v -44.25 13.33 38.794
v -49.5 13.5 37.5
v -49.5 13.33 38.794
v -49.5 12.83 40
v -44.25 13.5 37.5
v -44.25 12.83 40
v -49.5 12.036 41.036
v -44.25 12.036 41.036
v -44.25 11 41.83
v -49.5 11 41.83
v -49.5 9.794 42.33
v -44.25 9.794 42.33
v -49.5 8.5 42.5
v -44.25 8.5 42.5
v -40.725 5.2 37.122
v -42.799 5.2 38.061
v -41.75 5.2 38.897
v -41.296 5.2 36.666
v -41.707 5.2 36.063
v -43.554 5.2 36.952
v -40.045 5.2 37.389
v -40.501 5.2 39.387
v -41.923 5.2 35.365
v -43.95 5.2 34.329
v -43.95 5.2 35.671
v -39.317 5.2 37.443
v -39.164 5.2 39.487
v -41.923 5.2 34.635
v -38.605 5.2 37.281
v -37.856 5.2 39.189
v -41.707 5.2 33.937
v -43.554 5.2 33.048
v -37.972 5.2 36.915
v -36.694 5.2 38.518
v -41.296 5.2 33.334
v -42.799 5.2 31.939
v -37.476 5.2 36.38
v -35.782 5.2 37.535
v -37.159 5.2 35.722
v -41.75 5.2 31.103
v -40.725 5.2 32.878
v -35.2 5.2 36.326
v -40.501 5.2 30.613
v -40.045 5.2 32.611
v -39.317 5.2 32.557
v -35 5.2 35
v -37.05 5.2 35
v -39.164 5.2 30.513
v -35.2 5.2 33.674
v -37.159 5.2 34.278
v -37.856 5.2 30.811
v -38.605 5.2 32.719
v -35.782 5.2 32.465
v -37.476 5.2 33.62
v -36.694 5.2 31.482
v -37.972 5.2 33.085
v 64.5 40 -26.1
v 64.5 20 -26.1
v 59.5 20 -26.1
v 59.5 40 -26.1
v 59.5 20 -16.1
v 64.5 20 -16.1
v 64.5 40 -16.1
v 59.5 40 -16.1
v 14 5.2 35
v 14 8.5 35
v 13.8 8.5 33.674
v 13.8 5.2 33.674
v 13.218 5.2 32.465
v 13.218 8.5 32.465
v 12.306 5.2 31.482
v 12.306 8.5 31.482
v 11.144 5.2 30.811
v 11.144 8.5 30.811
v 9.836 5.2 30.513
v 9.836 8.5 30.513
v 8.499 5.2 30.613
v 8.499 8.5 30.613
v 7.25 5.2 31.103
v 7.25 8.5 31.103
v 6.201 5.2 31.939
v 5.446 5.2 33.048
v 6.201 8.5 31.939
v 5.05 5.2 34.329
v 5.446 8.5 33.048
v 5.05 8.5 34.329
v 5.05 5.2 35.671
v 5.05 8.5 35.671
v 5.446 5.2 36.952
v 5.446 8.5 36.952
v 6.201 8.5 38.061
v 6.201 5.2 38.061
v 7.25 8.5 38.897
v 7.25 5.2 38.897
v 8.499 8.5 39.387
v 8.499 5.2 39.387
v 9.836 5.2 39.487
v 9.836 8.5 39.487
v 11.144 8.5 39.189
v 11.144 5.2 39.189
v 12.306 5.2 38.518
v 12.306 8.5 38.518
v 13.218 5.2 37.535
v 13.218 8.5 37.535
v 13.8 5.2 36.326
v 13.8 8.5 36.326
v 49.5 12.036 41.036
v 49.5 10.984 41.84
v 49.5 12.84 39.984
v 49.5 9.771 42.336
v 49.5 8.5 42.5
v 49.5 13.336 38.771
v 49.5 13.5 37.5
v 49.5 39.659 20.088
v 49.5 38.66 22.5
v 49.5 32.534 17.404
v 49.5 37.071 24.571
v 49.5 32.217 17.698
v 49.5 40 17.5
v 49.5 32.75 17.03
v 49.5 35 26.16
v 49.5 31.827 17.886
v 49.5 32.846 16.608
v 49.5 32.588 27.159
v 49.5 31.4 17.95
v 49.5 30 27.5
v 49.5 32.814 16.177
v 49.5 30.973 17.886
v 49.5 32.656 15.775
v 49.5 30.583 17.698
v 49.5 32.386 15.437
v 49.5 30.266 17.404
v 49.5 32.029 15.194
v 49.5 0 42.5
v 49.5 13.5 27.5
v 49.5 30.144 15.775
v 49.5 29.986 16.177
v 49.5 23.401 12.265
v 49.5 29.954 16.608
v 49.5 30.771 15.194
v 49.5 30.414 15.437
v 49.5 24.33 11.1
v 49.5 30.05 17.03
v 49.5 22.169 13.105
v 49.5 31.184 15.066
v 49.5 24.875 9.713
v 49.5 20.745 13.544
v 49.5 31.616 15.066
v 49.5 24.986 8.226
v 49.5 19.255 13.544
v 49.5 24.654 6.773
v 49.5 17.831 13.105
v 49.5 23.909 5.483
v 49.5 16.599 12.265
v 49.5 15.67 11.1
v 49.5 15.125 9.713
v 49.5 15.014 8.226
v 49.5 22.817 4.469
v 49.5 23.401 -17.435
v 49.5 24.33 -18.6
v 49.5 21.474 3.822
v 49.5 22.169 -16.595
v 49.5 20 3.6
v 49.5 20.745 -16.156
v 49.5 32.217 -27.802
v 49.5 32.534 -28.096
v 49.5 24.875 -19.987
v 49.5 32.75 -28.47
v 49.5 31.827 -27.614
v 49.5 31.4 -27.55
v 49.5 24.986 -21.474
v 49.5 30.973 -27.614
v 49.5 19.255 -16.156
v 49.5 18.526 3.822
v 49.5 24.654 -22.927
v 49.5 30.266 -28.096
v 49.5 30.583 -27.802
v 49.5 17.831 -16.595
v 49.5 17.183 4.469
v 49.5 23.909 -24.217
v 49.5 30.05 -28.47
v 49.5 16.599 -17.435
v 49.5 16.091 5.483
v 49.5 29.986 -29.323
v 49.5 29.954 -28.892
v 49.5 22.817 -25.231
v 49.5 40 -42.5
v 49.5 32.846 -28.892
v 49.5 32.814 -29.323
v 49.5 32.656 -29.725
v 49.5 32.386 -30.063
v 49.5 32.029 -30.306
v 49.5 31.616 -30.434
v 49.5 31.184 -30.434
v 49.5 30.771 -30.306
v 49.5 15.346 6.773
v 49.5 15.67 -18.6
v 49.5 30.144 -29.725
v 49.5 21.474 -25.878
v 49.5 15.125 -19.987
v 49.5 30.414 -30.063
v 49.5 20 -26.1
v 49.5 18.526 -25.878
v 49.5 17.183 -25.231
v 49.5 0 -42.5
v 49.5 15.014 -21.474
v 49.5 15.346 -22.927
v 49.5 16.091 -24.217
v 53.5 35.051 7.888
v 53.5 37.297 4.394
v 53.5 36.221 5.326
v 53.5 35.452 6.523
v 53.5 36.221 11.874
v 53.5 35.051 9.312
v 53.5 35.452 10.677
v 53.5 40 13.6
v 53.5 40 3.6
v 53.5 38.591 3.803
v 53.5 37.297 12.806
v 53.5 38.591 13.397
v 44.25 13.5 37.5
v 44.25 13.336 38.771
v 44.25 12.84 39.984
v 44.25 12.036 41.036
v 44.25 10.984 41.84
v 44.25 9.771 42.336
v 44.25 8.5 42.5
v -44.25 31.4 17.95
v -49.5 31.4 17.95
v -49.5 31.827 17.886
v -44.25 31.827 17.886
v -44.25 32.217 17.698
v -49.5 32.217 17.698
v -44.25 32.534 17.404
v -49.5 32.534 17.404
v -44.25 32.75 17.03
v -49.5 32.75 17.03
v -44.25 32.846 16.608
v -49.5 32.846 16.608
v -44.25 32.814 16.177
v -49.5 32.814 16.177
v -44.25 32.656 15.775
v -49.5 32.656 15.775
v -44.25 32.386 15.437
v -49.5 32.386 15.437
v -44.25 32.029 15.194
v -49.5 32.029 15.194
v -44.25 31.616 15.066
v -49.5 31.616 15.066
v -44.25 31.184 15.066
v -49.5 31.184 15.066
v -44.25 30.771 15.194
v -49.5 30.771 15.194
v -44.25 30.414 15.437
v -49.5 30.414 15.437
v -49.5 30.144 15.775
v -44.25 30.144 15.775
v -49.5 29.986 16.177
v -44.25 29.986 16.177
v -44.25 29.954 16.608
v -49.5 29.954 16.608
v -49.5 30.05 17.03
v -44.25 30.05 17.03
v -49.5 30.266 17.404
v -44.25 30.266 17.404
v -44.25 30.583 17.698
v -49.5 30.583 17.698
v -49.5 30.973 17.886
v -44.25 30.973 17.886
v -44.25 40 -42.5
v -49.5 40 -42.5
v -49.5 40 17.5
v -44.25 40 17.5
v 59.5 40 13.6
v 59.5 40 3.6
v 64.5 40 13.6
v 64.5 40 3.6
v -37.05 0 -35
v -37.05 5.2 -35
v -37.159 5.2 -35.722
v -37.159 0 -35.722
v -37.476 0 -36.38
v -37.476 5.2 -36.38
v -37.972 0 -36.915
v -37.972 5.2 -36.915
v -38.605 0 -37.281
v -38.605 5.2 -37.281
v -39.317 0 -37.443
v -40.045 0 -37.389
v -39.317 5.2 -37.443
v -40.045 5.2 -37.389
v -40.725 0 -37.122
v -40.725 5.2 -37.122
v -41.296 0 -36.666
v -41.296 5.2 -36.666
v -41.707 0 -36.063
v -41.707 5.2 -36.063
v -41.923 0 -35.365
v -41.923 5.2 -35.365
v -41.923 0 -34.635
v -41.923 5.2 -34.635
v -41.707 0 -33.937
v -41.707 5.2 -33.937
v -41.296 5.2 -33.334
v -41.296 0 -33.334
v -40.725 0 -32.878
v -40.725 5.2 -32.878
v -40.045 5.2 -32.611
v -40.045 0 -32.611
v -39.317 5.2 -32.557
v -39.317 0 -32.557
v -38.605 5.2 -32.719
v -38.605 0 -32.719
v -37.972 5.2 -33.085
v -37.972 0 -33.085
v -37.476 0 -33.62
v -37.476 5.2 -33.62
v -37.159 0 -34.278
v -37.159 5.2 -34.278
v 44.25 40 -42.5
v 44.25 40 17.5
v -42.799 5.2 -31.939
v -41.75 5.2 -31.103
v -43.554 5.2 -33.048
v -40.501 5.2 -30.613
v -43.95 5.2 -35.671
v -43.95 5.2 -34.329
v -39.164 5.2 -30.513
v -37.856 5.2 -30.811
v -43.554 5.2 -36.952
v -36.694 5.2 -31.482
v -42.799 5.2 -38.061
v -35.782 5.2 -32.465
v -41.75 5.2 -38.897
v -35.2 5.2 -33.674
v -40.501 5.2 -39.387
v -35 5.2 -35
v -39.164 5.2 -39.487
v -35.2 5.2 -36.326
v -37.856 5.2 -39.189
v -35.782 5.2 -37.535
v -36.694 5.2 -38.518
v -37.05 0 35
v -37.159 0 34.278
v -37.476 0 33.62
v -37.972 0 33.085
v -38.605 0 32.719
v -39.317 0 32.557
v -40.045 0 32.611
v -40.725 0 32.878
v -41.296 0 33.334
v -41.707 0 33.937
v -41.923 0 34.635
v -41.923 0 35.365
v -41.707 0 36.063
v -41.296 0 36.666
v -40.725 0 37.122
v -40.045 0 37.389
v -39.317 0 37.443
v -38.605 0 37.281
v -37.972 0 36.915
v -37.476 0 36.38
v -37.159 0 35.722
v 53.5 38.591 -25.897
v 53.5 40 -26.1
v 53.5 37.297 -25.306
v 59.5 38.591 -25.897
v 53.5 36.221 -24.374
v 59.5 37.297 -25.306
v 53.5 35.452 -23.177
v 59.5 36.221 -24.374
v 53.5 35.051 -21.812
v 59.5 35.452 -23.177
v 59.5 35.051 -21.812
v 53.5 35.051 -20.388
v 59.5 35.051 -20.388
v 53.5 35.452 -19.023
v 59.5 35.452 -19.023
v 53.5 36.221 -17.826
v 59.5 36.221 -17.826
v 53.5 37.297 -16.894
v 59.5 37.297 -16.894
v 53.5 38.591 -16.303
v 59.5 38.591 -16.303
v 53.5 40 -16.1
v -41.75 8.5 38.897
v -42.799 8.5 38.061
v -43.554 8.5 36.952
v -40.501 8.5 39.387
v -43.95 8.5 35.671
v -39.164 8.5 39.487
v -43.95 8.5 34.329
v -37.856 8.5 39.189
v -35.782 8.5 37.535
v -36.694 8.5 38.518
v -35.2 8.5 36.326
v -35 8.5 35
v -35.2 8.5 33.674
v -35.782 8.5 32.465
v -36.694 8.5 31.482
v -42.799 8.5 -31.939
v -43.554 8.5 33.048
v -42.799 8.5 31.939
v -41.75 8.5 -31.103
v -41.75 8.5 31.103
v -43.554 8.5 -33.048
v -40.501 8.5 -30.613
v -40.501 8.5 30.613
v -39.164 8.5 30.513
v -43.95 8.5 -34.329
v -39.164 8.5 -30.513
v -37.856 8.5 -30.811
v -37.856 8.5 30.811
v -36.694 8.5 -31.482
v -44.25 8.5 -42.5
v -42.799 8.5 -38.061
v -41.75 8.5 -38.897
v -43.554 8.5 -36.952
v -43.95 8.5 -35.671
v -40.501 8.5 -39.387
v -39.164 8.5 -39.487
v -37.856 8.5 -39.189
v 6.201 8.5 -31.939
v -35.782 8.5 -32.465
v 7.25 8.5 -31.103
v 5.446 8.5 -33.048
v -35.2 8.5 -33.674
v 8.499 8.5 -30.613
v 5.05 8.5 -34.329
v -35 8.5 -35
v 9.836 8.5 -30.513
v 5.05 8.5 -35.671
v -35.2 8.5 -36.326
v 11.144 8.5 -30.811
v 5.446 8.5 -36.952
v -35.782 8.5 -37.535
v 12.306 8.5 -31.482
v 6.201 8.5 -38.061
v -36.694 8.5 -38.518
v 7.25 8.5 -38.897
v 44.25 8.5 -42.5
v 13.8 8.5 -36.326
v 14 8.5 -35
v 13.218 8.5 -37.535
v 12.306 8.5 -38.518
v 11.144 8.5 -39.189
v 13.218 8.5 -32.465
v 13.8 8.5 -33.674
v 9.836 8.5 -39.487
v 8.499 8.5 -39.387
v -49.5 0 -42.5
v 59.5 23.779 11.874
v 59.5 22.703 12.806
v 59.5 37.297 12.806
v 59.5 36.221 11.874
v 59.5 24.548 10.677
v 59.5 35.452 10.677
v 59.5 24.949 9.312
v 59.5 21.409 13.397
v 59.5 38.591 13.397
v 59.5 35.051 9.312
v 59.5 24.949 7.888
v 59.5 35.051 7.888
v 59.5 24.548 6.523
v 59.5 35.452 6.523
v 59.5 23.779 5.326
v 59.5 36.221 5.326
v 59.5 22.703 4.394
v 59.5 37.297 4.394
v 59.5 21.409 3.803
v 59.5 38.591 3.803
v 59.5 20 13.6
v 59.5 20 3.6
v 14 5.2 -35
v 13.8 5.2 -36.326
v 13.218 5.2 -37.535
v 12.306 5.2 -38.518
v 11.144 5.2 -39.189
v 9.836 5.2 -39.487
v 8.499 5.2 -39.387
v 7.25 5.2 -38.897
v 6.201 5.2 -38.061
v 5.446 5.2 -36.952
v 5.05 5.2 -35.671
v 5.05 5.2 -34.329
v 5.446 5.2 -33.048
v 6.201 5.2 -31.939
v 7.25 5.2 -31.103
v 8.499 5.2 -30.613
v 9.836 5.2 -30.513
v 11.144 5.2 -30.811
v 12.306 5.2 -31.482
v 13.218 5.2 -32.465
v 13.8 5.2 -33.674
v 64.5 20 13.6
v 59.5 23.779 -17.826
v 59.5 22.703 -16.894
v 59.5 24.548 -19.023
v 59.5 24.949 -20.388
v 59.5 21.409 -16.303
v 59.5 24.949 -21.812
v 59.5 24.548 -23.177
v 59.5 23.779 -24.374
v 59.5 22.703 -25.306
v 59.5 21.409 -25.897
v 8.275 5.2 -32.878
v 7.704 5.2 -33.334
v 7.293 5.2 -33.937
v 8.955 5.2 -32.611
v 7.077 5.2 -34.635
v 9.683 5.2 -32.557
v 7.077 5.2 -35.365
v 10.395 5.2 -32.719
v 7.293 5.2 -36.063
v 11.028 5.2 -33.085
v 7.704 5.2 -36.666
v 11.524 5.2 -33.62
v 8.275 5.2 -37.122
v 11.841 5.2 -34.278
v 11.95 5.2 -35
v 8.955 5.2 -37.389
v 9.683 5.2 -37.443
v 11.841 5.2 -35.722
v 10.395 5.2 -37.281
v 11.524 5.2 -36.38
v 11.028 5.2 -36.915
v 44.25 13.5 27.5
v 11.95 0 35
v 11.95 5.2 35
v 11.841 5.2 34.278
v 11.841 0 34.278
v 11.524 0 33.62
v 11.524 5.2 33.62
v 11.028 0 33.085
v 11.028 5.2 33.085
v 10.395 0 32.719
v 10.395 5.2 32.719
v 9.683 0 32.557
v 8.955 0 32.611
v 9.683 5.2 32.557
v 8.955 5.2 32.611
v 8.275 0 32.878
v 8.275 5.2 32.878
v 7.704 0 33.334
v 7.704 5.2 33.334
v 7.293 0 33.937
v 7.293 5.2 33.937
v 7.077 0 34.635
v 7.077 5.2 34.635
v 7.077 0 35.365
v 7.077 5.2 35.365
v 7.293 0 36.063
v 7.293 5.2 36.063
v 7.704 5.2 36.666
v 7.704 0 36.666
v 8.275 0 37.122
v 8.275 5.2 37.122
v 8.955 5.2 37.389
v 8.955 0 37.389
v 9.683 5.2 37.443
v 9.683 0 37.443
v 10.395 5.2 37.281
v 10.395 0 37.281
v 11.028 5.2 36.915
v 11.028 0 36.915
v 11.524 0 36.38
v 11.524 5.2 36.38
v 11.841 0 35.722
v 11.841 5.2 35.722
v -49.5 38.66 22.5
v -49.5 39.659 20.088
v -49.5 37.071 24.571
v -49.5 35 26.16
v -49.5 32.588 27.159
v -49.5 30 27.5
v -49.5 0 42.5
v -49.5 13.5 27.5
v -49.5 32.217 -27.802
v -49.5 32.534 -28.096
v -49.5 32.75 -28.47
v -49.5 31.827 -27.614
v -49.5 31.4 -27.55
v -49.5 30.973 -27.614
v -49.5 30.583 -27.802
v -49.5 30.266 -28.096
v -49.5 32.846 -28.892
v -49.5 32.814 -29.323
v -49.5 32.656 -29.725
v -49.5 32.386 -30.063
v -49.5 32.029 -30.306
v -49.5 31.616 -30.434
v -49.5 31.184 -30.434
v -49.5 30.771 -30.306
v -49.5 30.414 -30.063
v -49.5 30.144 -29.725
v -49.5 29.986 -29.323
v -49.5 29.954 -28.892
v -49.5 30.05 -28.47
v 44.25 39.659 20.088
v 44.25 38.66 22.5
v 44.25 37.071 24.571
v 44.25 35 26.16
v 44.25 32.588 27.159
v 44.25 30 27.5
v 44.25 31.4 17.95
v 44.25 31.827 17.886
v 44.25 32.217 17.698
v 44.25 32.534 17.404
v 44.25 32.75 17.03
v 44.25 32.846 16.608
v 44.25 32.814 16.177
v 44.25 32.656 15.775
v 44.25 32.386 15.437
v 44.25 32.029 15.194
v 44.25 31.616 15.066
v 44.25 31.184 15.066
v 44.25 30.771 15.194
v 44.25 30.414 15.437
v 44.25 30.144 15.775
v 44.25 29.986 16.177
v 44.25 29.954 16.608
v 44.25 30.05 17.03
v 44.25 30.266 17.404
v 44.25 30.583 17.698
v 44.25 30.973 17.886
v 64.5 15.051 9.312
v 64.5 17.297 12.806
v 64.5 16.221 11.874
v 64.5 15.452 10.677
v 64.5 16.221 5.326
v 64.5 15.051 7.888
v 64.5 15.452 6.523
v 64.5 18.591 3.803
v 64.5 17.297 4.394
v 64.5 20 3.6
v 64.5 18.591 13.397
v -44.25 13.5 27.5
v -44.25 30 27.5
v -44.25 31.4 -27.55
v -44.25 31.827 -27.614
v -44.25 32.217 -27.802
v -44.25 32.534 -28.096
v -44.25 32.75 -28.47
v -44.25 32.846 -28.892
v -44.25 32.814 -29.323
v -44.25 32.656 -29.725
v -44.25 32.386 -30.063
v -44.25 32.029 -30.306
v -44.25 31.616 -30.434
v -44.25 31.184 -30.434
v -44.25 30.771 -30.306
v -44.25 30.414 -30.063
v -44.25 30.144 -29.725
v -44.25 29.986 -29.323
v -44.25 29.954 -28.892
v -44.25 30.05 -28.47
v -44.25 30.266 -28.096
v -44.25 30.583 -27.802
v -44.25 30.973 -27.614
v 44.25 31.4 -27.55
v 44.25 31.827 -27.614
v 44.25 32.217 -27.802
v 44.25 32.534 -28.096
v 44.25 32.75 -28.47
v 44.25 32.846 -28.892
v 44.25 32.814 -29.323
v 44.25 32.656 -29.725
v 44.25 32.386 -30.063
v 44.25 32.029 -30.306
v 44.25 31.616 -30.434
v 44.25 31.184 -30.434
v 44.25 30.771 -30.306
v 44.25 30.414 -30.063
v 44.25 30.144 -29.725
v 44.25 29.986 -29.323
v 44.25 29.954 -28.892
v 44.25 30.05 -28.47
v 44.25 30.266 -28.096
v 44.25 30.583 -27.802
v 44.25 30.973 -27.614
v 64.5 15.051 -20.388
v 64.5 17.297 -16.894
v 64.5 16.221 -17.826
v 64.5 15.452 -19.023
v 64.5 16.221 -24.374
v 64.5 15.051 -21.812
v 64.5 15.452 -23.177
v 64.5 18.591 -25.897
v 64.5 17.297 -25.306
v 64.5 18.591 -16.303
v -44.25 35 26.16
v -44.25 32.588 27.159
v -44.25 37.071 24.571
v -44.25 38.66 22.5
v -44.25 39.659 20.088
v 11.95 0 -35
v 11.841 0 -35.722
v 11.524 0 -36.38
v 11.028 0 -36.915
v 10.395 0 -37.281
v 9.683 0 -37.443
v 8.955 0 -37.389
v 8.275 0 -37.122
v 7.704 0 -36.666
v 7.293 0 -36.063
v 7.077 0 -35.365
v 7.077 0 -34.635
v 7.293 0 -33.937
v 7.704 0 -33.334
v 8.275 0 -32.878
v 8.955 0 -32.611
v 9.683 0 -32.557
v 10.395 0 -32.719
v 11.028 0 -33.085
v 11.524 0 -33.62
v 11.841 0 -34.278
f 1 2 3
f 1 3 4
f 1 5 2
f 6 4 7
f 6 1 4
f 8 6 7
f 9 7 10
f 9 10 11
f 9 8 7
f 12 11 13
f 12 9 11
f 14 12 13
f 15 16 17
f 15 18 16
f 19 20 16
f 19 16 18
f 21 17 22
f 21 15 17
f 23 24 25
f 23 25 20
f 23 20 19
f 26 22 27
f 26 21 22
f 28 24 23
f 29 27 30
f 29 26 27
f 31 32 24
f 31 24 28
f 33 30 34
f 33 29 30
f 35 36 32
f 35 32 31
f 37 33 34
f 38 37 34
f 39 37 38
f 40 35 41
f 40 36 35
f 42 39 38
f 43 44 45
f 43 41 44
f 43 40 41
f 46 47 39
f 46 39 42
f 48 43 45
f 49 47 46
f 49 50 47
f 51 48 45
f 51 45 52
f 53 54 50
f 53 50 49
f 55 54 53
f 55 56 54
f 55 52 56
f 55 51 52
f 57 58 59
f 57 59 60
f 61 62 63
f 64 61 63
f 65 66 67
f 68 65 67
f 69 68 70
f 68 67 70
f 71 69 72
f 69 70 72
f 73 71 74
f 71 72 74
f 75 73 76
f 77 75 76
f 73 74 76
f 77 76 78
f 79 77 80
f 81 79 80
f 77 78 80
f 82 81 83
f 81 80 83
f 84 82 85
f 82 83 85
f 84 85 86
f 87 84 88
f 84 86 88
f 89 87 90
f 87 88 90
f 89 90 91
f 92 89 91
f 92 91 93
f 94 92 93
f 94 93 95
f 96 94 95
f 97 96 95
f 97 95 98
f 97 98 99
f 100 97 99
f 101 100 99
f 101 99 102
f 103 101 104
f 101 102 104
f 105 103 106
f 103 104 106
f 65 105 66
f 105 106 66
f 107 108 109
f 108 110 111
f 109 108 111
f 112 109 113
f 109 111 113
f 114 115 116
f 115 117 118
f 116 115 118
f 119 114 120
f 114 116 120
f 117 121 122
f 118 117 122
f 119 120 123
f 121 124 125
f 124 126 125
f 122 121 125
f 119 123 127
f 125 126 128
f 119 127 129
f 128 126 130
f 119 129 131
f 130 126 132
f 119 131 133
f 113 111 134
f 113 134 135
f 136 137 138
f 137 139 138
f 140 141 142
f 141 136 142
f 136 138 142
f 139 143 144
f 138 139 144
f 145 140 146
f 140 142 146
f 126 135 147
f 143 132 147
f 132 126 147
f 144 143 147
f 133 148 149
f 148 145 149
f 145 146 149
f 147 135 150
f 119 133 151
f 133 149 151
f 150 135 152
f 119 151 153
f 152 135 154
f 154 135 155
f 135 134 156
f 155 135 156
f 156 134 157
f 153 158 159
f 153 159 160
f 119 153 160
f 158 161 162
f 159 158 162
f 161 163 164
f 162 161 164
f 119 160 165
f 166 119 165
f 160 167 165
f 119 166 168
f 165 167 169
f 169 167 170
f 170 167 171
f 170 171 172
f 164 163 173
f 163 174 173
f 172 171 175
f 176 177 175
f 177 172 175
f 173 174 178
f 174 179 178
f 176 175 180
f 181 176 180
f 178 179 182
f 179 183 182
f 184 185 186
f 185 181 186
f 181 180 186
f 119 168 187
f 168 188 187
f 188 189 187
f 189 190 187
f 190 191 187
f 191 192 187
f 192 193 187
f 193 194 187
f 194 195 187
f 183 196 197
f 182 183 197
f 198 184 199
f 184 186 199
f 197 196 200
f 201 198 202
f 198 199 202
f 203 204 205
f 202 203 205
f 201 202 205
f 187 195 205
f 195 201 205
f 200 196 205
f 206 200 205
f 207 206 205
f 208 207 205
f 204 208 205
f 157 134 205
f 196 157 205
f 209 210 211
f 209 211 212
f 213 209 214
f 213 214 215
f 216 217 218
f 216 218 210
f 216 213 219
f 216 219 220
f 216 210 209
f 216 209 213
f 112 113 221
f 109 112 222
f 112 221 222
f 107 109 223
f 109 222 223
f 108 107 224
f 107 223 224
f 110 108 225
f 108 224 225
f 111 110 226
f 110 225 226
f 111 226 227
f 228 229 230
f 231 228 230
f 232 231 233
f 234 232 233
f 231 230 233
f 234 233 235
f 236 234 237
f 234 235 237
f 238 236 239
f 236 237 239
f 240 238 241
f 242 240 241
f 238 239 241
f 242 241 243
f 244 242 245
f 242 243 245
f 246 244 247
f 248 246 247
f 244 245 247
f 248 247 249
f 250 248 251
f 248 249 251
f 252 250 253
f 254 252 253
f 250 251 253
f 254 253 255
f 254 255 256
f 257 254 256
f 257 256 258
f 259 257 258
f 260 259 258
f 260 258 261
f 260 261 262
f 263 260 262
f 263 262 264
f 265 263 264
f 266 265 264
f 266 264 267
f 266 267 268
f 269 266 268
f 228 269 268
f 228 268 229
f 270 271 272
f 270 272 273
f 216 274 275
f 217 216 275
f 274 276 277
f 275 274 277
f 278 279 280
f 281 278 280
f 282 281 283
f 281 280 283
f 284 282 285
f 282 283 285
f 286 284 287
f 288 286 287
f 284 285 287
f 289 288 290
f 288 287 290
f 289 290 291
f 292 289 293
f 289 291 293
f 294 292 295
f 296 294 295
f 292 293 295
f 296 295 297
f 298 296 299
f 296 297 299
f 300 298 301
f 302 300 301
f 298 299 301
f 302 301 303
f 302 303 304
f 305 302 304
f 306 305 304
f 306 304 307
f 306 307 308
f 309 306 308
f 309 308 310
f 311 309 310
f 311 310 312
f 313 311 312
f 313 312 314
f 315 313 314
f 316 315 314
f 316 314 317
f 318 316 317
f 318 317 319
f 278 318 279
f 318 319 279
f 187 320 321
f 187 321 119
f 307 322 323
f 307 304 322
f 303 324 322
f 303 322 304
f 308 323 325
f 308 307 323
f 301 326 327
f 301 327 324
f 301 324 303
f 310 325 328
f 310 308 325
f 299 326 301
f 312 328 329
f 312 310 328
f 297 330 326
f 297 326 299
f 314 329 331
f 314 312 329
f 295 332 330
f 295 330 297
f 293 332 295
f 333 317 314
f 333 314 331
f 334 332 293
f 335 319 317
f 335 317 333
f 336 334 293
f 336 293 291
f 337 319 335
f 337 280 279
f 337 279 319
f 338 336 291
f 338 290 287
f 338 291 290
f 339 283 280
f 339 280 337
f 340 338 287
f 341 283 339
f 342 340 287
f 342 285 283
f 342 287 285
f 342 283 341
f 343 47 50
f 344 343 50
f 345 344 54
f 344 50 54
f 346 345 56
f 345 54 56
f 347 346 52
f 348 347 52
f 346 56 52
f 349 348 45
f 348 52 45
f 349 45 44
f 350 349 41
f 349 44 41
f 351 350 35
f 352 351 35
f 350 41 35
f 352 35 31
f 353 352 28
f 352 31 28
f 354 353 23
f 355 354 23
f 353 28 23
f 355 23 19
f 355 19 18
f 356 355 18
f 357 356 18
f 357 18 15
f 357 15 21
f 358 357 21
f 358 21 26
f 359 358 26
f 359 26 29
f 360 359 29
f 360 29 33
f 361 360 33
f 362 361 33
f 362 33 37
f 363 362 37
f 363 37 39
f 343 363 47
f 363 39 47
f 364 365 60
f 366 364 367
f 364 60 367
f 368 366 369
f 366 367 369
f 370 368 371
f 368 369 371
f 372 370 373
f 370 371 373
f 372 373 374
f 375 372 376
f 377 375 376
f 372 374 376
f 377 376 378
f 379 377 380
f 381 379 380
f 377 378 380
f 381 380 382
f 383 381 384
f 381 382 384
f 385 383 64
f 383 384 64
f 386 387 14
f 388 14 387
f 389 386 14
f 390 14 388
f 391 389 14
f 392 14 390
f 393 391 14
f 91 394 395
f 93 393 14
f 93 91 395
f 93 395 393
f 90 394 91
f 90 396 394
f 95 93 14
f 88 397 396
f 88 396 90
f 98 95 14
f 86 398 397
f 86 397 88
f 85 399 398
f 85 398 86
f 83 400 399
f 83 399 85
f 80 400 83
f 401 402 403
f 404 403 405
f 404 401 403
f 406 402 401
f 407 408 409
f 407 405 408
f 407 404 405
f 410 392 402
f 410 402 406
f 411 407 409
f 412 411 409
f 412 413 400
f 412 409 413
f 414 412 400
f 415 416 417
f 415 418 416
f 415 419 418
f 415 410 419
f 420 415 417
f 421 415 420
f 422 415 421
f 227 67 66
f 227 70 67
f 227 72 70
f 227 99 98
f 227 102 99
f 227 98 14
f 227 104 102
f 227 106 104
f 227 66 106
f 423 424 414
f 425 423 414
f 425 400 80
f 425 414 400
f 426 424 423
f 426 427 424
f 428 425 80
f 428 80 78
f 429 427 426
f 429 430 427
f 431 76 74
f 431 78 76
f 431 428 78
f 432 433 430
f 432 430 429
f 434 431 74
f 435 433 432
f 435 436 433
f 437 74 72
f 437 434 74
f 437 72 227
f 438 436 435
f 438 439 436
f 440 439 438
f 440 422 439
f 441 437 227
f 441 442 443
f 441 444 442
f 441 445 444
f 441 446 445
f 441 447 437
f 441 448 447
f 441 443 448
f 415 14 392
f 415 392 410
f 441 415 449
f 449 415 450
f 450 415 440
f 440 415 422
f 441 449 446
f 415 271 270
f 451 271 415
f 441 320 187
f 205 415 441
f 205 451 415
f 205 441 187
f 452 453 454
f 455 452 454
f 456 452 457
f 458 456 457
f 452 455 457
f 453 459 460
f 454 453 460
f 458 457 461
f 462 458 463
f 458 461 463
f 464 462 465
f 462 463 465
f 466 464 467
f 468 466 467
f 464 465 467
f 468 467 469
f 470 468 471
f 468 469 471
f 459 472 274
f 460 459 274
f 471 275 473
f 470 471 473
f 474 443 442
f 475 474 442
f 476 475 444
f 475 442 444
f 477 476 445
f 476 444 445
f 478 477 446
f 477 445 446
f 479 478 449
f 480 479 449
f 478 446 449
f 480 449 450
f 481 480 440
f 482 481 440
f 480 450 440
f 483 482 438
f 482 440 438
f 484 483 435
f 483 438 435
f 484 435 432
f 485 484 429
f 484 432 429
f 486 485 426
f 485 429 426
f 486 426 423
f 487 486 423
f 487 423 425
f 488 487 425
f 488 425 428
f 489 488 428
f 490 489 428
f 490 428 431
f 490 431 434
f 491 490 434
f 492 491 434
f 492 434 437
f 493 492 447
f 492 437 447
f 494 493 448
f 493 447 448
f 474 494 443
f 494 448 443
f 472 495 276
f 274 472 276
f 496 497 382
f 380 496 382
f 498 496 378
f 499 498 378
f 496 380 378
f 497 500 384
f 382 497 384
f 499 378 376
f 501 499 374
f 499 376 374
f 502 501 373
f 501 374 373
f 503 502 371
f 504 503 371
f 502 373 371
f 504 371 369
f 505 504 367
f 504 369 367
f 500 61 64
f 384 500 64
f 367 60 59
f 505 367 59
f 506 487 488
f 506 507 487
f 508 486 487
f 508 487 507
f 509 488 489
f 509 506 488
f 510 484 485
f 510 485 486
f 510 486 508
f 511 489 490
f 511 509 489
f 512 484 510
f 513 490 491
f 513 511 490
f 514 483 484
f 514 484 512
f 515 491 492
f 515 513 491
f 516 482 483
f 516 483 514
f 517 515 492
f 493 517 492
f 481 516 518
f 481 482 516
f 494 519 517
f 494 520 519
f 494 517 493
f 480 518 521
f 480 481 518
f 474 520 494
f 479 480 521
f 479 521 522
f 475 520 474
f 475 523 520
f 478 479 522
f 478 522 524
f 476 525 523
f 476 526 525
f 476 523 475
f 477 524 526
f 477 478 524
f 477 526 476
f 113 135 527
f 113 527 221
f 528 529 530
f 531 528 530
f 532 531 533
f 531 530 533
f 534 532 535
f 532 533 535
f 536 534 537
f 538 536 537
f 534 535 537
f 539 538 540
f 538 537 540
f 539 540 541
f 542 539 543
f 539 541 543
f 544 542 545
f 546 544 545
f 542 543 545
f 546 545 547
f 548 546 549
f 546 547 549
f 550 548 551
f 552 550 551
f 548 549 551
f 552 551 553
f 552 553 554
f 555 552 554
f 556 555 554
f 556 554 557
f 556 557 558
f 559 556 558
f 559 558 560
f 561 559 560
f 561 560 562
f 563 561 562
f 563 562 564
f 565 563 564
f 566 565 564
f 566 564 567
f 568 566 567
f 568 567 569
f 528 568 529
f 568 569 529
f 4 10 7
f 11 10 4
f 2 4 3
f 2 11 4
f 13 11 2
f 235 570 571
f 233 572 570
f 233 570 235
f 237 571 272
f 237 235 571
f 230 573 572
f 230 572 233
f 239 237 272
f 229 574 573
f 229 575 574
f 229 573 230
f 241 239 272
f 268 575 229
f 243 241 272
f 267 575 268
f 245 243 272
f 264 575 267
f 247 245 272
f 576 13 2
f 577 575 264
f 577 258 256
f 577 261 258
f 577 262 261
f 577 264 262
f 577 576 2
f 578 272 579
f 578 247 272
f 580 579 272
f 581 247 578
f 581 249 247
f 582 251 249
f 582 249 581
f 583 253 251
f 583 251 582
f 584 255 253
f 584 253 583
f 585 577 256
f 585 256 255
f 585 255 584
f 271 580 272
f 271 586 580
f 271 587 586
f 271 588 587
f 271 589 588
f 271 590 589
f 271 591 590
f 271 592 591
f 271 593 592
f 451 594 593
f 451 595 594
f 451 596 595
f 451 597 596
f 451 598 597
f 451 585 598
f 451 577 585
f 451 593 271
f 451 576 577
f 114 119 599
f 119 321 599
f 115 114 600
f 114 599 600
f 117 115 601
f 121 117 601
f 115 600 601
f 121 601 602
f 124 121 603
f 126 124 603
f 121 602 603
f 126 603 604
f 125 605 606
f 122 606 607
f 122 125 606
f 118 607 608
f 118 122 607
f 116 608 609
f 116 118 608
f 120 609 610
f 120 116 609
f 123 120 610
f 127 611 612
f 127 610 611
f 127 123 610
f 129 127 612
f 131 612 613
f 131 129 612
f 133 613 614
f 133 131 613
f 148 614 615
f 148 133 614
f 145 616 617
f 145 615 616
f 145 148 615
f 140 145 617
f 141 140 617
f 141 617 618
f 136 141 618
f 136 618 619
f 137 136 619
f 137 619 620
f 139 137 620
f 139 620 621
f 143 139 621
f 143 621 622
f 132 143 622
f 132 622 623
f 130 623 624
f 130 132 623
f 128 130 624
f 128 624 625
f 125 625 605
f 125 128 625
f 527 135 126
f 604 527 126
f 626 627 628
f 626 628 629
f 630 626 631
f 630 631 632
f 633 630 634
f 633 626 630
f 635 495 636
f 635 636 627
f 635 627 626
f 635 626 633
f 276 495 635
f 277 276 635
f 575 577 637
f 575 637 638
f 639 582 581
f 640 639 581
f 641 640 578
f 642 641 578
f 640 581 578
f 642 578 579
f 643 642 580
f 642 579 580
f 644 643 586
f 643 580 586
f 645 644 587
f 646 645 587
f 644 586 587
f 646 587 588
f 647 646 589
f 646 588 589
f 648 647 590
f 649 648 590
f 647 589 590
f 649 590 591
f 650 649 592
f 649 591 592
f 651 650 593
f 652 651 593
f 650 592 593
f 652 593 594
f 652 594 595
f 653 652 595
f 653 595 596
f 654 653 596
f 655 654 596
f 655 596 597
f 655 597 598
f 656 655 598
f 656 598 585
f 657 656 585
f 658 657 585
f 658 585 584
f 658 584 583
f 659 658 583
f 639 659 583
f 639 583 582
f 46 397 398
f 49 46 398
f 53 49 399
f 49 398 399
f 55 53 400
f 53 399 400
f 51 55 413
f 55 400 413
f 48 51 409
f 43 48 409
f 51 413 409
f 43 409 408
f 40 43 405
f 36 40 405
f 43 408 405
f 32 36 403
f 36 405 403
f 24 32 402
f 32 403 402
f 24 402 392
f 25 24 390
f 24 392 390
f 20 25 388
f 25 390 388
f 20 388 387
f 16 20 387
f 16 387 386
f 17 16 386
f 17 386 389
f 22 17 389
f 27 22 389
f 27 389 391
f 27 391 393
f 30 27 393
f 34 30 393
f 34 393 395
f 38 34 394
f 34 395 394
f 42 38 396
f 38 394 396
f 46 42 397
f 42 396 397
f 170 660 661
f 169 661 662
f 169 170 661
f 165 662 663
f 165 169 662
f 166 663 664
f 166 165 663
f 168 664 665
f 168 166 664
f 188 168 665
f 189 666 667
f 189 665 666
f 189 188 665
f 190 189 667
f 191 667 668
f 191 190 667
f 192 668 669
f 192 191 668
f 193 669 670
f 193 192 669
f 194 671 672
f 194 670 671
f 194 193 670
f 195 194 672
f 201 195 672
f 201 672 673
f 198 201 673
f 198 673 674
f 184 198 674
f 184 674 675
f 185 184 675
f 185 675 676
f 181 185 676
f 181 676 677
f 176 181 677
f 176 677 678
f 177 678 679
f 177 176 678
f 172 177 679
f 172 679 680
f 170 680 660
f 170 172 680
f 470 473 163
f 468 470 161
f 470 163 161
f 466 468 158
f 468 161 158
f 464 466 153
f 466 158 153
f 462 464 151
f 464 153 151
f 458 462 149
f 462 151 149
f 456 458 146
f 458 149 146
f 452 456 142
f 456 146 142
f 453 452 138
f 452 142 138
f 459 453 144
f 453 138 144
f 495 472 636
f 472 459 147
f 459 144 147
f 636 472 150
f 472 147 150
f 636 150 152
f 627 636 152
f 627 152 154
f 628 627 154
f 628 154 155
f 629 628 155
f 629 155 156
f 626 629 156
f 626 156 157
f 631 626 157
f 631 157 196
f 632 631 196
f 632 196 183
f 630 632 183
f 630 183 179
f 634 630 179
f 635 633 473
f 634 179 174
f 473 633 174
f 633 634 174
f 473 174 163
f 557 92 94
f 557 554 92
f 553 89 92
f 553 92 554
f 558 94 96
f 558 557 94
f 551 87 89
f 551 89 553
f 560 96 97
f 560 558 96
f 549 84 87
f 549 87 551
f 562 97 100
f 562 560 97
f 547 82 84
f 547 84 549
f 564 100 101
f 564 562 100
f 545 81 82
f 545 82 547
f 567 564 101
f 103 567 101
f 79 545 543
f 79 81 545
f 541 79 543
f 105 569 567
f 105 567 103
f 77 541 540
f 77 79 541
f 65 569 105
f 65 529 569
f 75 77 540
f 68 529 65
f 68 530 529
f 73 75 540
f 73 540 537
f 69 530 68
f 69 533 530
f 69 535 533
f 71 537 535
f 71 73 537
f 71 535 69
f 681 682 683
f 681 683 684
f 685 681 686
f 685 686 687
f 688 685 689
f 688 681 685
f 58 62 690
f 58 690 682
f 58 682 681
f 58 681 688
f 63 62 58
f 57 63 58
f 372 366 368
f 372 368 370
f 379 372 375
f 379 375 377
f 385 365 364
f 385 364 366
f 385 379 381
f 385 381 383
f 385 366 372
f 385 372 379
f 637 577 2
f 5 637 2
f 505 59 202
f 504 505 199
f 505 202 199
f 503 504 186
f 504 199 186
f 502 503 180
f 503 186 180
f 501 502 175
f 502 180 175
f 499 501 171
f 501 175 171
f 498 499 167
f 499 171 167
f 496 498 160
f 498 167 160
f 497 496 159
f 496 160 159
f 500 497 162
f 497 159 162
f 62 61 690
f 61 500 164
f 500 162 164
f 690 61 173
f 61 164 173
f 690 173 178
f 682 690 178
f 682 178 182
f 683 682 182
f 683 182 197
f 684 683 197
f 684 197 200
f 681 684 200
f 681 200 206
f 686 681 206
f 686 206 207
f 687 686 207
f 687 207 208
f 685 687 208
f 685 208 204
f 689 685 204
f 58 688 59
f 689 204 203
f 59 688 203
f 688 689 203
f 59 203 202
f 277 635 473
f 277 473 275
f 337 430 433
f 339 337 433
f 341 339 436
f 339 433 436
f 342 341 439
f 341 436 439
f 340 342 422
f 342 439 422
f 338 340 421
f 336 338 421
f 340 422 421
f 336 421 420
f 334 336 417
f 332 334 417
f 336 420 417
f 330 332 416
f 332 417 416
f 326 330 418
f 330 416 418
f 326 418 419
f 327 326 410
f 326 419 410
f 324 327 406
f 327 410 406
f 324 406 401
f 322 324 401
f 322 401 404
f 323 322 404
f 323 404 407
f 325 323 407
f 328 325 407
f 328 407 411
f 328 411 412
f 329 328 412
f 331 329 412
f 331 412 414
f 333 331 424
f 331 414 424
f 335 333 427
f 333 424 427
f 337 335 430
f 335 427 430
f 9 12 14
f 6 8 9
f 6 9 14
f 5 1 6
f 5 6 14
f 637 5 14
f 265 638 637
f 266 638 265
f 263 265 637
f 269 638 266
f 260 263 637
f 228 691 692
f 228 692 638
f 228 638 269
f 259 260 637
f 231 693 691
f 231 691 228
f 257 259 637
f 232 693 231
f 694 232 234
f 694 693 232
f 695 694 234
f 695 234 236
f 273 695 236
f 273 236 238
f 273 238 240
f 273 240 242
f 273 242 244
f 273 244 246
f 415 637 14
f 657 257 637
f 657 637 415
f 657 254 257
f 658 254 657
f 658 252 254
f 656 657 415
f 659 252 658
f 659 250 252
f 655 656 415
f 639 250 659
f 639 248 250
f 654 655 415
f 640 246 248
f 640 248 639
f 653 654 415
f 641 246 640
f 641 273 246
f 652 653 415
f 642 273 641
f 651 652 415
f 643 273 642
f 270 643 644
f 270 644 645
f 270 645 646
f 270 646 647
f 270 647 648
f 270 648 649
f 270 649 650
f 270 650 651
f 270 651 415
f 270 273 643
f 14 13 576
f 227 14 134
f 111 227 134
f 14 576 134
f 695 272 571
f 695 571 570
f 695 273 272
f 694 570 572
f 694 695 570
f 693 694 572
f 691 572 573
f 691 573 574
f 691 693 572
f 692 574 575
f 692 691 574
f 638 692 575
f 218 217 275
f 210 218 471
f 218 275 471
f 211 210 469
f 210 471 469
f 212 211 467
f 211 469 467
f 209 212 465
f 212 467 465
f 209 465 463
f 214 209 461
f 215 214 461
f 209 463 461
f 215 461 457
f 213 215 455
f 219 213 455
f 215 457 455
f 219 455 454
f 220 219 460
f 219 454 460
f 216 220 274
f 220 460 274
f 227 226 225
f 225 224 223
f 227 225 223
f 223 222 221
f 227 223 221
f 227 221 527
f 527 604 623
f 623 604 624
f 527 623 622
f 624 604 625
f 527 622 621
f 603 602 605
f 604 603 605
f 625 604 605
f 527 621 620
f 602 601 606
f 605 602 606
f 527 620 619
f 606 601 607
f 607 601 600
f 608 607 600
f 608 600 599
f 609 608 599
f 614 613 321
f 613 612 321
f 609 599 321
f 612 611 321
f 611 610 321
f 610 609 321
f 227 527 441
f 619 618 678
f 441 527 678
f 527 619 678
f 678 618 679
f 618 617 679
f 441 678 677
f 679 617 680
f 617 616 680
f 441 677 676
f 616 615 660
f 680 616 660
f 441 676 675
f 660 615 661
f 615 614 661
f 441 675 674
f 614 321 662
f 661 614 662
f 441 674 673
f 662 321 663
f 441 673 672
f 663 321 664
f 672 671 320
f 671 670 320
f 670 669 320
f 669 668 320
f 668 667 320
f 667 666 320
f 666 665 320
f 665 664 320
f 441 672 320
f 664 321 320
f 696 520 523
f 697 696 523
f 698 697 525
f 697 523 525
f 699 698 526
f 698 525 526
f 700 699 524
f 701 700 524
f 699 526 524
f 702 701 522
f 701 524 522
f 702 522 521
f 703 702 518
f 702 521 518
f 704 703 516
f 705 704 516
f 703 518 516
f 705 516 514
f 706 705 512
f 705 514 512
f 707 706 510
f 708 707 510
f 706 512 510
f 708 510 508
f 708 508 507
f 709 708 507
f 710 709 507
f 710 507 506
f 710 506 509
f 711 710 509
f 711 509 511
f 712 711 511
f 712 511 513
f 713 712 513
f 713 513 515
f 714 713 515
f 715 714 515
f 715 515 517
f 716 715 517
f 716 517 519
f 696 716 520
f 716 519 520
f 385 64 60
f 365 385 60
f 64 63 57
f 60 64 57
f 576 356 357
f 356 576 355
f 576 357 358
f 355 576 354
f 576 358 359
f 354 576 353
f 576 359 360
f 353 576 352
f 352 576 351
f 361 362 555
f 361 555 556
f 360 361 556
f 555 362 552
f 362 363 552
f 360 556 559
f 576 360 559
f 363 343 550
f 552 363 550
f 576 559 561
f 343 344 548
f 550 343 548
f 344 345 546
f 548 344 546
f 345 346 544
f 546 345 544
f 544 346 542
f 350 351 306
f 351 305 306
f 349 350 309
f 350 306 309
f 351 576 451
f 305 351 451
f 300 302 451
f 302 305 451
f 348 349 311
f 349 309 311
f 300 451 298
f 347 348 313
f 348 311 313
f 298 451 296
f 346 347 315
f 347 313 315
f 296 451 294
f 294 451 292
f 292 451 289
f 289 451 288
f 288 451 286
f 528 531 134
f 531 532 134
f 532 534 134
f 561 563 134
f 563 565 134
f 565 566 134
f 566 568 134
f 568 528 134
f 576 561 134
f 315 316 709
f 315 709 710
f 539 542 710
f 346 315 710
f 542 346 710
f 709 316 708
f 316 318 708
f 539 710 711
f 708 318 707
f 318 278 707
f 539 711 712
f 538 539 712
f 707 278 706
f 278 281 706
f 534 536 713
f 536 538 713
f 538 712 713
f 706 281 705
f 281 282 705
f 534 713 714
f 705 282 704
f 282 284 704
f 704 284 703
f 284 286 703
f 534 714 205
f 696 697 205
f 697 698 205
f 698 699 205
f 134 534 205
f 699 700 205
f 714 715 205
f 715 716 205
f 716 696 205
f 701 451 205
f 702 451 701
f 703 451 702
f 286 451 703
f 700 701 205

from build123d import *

# Parameters (mm, degrees)
SKETCH1_W            = 99
SKETCH1_H            = 85
BOSS_EXTRUDE1_DEPTH  = 40
SKETCH2_W            = 88.5
SKETCH2_H            = 85
CUT_EXTRUDE1_DEPTH   = 31.5
SKETCH5_R            = 4.5
CUT_EXTRUDE3_DEPTH   = 3.3
SKETCH6_R            = 2.45
CUT_EXTRUDE4_DEPTH   = 5.2
SKETCH16_R           = 1.45
CUT_EXTRUDE6_DEPTH   = 93.75
SKETCH17_R           = 5
BOSS_EXTRUDE2_DEPTH  = 15
SKETCH18_W           = 10
SKETCH18_H           = 20
BOSS_EXTRUDE3_DEPTH  = 5
BOSS_EXTRUDE4_DEPTH  = 11
SKETCH20_W           = 15
SKETCH20_H           = 26.5
CUT_EXTRUDE7_DEPTH   = 93.75
FILLET1_R            = 10
FILLET2_R            = 5
FILLET1_OF_MIRROR3_R = 10
FILLET2_OF_MIRROR3_R = 5
SKETCH21_W           = 10
SKETCH21_H           = 20
BOSS_EXTRUDE5_DEPTH  = 5
BOSS_EXTRUDE7_DEPTH  = 11


with BuildPart() as part:
    # Sketch1 → Boss-Extrude1 (new body)
    with BuildSketch(Plane(origin=(0, 0, 0), x_dir=(1, 0, 0), z_dir=(0, 1, 0))):
        Rectangle(SKETCH1_W, SKETCH1_H)
    extrude(amount=BOSS_EXTRUDE1_DEPTH)

    # Sketch2 → Cut-Extrude1 (cut)
    with BuildSketch(Plane(origin=(0, 40, 0), x_dir=(1, 0, 0), z_dir=(0, 1, 0))):
        Rectangle(SKETCH2_W, SKETCH2_H)
    extrude(amount=-CUT_EXTRUDE1_DEPTH, mode=Mode.SUBTRACT)

    # Sketch5 → Cut-Extrude3 (cut)
    with BuildSketch(Plane(origin=(0, 8.5, 0), x_dir=(1, 0, 0), z_dir=(0, 1, 0))):
        with Locations((-39.5, 35)):
            Circle(SKETCH5_R)
        with Locations((9.5, 35)):
            Circle(SKETCH5_R)
        with Locations((-39.5, -35)):
            Circle(SKETCH5_R)
        with Locations((9.5, -35)):
            Circle(SKETCH5_R)
    extrude(amount=-CUT_EXTRUDE3_DEPTH, mode=Mode.SUBTRACT)

    # Sketch6 → Cut-Extrude4 (cut)
    with BuildSketch(Plane(origin=(0, 5.2, 0), x_dir=(1, 0, 0), z_dir=(0, 1, 0))):
        with Locations((-39.5, 35)):
            Circle(SKETCH6_R)
        with Locations((9.5, 35)):
            Circle(SKETCH6_R)
        with Locations((9.5, -35)):
            Circle(SKETCH6_R)
        with Locations((-39.5, -35)):
            Circle(SKETCH6_R)
    extrude(amount=-CUT_EXTRUDE4_DEPTH, mode=Mode.SUBTRACT)

    # Sketch16 → Cut-Extrude6 (cut)
    with BuildSketch(Plane.ZY.offset(49.5)):
        with Locations((-29, 31.4)):
            Circle(SKETCH16_R)
        with Locations((16.5, 31.4)):
            Circle(SKETCH16_R)
    cut_extrude6 = extrude(amount=-CUT_EXTRUDE6_DEPTH, mode=Mode.SUBTRACT)

    # Mirror1: Cut-Extrude6 across plane
    add(cut_extrude6.mirror(Plane(origin=(0, 0, 0), x_dir=(0, 0, 1), z_dir=(1, 0, 0))), mode=Mode.SUBTRACT)

    # Sketch17 → Boss-Extrude2 (add)
    with BuildSketch(Plane(origin=(49.5, 0, 0), x_dir=(0, 0, -1), z_dir=(1, 0, 0))):
        with Locations((-8.6, 20)):
            Circle(SKETCH17_R)
        with Locations((21.1, 20)):
            Circle(SKETCH17_R)
    extrude(amount=BOSS_EXTRUDE2_DEPTH)

    # Sketch18 → Boss-Extrude3 (add)
    with BuildSketch(Plane(origin=(64.5, 0, 0), x_dir=(0, 0, -1), z_dir=(1, 0, 0))):
        with Locations((-8.6, 30)):
            Rectangle(SKETCH18_W, SKETCH18_H)
    extrude(amount=-BOSS_EXTRUDE3_DEPTH)

    # Sketch19 → Boss-Extrude4 (add)
    with BuildSketch(Plane(origin=(64.5, 0, 0), x_dir=(0, 0, -1), z_dir=(1, 0, 0))):
        with BuildLine():
            Line((-13.6, 40), (-3.6, 40))
            ThreePointArc((-3.6, 40), (-8.6, 35), (-13.6, 40))
        make_face()
    extrude(amount=-BOSS_EXTRUDE4_DEPTH)

    # Sketch20 → Cut-Extrude7 (cut)
    with BuildSketch(Plane.ZY.offset(49.5)):
        with Locations((35, 26.75)):
            Rectangle(SKETCH20_W, SKETCH20_H)
    cut_extrude7 = extrude(amount=-CUT_EXTRUDE7_DEPTH, mode=Mode.SUBTRACT)

    # Fillet1
    fillet1_edges = [part.edges().sort_by_distance(p)[0] for p in [
        (-46.875, 40, 27.5),
    ]]
    fillet(fillet1_edges, radius=FILLET1_R)

    # Fillet2
    fillet2_edges = [part.edges().sort_by_distance(p)[0] for p in [
        (-46.875, 13.5, 42.5),
    ]]
    fillet(fillet2_edges, radius=FILLET2_R)

    # Mirror3: Cut-Extrude7 across plane
    add(cut_extrude7.mirror(Plane(origin=(0, 0, 0), x_dir=(0, 0, 1), z_dir=(1, 0, 0))), mode=Mode.SUBTRACT)

    # Fillet1 of Mirror3
    fillet1_of_mirror3_edges = [part.edges().sort_by_distance(p)[0] for p in [
        (46.875, 40, 27.5),
    ]]
    fillet(fillet1_of_mirror3_edges, radius=FILLET1_OF_MIRROR3_R)

    # Fillet2 of Mirror3
    fillet2_of_mirror3_edges = [part.edges().sort_by_distance(p)[0] for p in [
        (46.875, 13.5, 42.5),
    ]]
    fillet(fillet2_of_mirror3_edges, radius=FILLET2_OF_MIRROR3_R)

    # Sketch21 → Boss-Extrude5 (add)
    with BuildSketch(Plane(origin=(64.5, 0, 0), x_dir=(0, 0, -1), z_dir=(1, 0, 0))):
        with Locations((21.1, 30)):
            Rectangle(SKETCH21_W, SKETCH21_H)
    extrude(amount=-BOSS_EXTRUDE5_DEPTH)

    # Sketch23 → Boss-Extrude7 (add)
    with BuildSketch(Plane(origin=(64.5, 0, 0), x_dir=(0, 0, -1), z_dir=(1, 0, 0))):
        with BuildLine():
            Line((16.1, 40), (26.1, 40))
            ThreePointArc((26.1, 40), (21.1, 35), (16.1, 40))
        make_face()
    extrude(amount=-BOSS_EXTRUDE7_DEPTH)


solid = part.part
